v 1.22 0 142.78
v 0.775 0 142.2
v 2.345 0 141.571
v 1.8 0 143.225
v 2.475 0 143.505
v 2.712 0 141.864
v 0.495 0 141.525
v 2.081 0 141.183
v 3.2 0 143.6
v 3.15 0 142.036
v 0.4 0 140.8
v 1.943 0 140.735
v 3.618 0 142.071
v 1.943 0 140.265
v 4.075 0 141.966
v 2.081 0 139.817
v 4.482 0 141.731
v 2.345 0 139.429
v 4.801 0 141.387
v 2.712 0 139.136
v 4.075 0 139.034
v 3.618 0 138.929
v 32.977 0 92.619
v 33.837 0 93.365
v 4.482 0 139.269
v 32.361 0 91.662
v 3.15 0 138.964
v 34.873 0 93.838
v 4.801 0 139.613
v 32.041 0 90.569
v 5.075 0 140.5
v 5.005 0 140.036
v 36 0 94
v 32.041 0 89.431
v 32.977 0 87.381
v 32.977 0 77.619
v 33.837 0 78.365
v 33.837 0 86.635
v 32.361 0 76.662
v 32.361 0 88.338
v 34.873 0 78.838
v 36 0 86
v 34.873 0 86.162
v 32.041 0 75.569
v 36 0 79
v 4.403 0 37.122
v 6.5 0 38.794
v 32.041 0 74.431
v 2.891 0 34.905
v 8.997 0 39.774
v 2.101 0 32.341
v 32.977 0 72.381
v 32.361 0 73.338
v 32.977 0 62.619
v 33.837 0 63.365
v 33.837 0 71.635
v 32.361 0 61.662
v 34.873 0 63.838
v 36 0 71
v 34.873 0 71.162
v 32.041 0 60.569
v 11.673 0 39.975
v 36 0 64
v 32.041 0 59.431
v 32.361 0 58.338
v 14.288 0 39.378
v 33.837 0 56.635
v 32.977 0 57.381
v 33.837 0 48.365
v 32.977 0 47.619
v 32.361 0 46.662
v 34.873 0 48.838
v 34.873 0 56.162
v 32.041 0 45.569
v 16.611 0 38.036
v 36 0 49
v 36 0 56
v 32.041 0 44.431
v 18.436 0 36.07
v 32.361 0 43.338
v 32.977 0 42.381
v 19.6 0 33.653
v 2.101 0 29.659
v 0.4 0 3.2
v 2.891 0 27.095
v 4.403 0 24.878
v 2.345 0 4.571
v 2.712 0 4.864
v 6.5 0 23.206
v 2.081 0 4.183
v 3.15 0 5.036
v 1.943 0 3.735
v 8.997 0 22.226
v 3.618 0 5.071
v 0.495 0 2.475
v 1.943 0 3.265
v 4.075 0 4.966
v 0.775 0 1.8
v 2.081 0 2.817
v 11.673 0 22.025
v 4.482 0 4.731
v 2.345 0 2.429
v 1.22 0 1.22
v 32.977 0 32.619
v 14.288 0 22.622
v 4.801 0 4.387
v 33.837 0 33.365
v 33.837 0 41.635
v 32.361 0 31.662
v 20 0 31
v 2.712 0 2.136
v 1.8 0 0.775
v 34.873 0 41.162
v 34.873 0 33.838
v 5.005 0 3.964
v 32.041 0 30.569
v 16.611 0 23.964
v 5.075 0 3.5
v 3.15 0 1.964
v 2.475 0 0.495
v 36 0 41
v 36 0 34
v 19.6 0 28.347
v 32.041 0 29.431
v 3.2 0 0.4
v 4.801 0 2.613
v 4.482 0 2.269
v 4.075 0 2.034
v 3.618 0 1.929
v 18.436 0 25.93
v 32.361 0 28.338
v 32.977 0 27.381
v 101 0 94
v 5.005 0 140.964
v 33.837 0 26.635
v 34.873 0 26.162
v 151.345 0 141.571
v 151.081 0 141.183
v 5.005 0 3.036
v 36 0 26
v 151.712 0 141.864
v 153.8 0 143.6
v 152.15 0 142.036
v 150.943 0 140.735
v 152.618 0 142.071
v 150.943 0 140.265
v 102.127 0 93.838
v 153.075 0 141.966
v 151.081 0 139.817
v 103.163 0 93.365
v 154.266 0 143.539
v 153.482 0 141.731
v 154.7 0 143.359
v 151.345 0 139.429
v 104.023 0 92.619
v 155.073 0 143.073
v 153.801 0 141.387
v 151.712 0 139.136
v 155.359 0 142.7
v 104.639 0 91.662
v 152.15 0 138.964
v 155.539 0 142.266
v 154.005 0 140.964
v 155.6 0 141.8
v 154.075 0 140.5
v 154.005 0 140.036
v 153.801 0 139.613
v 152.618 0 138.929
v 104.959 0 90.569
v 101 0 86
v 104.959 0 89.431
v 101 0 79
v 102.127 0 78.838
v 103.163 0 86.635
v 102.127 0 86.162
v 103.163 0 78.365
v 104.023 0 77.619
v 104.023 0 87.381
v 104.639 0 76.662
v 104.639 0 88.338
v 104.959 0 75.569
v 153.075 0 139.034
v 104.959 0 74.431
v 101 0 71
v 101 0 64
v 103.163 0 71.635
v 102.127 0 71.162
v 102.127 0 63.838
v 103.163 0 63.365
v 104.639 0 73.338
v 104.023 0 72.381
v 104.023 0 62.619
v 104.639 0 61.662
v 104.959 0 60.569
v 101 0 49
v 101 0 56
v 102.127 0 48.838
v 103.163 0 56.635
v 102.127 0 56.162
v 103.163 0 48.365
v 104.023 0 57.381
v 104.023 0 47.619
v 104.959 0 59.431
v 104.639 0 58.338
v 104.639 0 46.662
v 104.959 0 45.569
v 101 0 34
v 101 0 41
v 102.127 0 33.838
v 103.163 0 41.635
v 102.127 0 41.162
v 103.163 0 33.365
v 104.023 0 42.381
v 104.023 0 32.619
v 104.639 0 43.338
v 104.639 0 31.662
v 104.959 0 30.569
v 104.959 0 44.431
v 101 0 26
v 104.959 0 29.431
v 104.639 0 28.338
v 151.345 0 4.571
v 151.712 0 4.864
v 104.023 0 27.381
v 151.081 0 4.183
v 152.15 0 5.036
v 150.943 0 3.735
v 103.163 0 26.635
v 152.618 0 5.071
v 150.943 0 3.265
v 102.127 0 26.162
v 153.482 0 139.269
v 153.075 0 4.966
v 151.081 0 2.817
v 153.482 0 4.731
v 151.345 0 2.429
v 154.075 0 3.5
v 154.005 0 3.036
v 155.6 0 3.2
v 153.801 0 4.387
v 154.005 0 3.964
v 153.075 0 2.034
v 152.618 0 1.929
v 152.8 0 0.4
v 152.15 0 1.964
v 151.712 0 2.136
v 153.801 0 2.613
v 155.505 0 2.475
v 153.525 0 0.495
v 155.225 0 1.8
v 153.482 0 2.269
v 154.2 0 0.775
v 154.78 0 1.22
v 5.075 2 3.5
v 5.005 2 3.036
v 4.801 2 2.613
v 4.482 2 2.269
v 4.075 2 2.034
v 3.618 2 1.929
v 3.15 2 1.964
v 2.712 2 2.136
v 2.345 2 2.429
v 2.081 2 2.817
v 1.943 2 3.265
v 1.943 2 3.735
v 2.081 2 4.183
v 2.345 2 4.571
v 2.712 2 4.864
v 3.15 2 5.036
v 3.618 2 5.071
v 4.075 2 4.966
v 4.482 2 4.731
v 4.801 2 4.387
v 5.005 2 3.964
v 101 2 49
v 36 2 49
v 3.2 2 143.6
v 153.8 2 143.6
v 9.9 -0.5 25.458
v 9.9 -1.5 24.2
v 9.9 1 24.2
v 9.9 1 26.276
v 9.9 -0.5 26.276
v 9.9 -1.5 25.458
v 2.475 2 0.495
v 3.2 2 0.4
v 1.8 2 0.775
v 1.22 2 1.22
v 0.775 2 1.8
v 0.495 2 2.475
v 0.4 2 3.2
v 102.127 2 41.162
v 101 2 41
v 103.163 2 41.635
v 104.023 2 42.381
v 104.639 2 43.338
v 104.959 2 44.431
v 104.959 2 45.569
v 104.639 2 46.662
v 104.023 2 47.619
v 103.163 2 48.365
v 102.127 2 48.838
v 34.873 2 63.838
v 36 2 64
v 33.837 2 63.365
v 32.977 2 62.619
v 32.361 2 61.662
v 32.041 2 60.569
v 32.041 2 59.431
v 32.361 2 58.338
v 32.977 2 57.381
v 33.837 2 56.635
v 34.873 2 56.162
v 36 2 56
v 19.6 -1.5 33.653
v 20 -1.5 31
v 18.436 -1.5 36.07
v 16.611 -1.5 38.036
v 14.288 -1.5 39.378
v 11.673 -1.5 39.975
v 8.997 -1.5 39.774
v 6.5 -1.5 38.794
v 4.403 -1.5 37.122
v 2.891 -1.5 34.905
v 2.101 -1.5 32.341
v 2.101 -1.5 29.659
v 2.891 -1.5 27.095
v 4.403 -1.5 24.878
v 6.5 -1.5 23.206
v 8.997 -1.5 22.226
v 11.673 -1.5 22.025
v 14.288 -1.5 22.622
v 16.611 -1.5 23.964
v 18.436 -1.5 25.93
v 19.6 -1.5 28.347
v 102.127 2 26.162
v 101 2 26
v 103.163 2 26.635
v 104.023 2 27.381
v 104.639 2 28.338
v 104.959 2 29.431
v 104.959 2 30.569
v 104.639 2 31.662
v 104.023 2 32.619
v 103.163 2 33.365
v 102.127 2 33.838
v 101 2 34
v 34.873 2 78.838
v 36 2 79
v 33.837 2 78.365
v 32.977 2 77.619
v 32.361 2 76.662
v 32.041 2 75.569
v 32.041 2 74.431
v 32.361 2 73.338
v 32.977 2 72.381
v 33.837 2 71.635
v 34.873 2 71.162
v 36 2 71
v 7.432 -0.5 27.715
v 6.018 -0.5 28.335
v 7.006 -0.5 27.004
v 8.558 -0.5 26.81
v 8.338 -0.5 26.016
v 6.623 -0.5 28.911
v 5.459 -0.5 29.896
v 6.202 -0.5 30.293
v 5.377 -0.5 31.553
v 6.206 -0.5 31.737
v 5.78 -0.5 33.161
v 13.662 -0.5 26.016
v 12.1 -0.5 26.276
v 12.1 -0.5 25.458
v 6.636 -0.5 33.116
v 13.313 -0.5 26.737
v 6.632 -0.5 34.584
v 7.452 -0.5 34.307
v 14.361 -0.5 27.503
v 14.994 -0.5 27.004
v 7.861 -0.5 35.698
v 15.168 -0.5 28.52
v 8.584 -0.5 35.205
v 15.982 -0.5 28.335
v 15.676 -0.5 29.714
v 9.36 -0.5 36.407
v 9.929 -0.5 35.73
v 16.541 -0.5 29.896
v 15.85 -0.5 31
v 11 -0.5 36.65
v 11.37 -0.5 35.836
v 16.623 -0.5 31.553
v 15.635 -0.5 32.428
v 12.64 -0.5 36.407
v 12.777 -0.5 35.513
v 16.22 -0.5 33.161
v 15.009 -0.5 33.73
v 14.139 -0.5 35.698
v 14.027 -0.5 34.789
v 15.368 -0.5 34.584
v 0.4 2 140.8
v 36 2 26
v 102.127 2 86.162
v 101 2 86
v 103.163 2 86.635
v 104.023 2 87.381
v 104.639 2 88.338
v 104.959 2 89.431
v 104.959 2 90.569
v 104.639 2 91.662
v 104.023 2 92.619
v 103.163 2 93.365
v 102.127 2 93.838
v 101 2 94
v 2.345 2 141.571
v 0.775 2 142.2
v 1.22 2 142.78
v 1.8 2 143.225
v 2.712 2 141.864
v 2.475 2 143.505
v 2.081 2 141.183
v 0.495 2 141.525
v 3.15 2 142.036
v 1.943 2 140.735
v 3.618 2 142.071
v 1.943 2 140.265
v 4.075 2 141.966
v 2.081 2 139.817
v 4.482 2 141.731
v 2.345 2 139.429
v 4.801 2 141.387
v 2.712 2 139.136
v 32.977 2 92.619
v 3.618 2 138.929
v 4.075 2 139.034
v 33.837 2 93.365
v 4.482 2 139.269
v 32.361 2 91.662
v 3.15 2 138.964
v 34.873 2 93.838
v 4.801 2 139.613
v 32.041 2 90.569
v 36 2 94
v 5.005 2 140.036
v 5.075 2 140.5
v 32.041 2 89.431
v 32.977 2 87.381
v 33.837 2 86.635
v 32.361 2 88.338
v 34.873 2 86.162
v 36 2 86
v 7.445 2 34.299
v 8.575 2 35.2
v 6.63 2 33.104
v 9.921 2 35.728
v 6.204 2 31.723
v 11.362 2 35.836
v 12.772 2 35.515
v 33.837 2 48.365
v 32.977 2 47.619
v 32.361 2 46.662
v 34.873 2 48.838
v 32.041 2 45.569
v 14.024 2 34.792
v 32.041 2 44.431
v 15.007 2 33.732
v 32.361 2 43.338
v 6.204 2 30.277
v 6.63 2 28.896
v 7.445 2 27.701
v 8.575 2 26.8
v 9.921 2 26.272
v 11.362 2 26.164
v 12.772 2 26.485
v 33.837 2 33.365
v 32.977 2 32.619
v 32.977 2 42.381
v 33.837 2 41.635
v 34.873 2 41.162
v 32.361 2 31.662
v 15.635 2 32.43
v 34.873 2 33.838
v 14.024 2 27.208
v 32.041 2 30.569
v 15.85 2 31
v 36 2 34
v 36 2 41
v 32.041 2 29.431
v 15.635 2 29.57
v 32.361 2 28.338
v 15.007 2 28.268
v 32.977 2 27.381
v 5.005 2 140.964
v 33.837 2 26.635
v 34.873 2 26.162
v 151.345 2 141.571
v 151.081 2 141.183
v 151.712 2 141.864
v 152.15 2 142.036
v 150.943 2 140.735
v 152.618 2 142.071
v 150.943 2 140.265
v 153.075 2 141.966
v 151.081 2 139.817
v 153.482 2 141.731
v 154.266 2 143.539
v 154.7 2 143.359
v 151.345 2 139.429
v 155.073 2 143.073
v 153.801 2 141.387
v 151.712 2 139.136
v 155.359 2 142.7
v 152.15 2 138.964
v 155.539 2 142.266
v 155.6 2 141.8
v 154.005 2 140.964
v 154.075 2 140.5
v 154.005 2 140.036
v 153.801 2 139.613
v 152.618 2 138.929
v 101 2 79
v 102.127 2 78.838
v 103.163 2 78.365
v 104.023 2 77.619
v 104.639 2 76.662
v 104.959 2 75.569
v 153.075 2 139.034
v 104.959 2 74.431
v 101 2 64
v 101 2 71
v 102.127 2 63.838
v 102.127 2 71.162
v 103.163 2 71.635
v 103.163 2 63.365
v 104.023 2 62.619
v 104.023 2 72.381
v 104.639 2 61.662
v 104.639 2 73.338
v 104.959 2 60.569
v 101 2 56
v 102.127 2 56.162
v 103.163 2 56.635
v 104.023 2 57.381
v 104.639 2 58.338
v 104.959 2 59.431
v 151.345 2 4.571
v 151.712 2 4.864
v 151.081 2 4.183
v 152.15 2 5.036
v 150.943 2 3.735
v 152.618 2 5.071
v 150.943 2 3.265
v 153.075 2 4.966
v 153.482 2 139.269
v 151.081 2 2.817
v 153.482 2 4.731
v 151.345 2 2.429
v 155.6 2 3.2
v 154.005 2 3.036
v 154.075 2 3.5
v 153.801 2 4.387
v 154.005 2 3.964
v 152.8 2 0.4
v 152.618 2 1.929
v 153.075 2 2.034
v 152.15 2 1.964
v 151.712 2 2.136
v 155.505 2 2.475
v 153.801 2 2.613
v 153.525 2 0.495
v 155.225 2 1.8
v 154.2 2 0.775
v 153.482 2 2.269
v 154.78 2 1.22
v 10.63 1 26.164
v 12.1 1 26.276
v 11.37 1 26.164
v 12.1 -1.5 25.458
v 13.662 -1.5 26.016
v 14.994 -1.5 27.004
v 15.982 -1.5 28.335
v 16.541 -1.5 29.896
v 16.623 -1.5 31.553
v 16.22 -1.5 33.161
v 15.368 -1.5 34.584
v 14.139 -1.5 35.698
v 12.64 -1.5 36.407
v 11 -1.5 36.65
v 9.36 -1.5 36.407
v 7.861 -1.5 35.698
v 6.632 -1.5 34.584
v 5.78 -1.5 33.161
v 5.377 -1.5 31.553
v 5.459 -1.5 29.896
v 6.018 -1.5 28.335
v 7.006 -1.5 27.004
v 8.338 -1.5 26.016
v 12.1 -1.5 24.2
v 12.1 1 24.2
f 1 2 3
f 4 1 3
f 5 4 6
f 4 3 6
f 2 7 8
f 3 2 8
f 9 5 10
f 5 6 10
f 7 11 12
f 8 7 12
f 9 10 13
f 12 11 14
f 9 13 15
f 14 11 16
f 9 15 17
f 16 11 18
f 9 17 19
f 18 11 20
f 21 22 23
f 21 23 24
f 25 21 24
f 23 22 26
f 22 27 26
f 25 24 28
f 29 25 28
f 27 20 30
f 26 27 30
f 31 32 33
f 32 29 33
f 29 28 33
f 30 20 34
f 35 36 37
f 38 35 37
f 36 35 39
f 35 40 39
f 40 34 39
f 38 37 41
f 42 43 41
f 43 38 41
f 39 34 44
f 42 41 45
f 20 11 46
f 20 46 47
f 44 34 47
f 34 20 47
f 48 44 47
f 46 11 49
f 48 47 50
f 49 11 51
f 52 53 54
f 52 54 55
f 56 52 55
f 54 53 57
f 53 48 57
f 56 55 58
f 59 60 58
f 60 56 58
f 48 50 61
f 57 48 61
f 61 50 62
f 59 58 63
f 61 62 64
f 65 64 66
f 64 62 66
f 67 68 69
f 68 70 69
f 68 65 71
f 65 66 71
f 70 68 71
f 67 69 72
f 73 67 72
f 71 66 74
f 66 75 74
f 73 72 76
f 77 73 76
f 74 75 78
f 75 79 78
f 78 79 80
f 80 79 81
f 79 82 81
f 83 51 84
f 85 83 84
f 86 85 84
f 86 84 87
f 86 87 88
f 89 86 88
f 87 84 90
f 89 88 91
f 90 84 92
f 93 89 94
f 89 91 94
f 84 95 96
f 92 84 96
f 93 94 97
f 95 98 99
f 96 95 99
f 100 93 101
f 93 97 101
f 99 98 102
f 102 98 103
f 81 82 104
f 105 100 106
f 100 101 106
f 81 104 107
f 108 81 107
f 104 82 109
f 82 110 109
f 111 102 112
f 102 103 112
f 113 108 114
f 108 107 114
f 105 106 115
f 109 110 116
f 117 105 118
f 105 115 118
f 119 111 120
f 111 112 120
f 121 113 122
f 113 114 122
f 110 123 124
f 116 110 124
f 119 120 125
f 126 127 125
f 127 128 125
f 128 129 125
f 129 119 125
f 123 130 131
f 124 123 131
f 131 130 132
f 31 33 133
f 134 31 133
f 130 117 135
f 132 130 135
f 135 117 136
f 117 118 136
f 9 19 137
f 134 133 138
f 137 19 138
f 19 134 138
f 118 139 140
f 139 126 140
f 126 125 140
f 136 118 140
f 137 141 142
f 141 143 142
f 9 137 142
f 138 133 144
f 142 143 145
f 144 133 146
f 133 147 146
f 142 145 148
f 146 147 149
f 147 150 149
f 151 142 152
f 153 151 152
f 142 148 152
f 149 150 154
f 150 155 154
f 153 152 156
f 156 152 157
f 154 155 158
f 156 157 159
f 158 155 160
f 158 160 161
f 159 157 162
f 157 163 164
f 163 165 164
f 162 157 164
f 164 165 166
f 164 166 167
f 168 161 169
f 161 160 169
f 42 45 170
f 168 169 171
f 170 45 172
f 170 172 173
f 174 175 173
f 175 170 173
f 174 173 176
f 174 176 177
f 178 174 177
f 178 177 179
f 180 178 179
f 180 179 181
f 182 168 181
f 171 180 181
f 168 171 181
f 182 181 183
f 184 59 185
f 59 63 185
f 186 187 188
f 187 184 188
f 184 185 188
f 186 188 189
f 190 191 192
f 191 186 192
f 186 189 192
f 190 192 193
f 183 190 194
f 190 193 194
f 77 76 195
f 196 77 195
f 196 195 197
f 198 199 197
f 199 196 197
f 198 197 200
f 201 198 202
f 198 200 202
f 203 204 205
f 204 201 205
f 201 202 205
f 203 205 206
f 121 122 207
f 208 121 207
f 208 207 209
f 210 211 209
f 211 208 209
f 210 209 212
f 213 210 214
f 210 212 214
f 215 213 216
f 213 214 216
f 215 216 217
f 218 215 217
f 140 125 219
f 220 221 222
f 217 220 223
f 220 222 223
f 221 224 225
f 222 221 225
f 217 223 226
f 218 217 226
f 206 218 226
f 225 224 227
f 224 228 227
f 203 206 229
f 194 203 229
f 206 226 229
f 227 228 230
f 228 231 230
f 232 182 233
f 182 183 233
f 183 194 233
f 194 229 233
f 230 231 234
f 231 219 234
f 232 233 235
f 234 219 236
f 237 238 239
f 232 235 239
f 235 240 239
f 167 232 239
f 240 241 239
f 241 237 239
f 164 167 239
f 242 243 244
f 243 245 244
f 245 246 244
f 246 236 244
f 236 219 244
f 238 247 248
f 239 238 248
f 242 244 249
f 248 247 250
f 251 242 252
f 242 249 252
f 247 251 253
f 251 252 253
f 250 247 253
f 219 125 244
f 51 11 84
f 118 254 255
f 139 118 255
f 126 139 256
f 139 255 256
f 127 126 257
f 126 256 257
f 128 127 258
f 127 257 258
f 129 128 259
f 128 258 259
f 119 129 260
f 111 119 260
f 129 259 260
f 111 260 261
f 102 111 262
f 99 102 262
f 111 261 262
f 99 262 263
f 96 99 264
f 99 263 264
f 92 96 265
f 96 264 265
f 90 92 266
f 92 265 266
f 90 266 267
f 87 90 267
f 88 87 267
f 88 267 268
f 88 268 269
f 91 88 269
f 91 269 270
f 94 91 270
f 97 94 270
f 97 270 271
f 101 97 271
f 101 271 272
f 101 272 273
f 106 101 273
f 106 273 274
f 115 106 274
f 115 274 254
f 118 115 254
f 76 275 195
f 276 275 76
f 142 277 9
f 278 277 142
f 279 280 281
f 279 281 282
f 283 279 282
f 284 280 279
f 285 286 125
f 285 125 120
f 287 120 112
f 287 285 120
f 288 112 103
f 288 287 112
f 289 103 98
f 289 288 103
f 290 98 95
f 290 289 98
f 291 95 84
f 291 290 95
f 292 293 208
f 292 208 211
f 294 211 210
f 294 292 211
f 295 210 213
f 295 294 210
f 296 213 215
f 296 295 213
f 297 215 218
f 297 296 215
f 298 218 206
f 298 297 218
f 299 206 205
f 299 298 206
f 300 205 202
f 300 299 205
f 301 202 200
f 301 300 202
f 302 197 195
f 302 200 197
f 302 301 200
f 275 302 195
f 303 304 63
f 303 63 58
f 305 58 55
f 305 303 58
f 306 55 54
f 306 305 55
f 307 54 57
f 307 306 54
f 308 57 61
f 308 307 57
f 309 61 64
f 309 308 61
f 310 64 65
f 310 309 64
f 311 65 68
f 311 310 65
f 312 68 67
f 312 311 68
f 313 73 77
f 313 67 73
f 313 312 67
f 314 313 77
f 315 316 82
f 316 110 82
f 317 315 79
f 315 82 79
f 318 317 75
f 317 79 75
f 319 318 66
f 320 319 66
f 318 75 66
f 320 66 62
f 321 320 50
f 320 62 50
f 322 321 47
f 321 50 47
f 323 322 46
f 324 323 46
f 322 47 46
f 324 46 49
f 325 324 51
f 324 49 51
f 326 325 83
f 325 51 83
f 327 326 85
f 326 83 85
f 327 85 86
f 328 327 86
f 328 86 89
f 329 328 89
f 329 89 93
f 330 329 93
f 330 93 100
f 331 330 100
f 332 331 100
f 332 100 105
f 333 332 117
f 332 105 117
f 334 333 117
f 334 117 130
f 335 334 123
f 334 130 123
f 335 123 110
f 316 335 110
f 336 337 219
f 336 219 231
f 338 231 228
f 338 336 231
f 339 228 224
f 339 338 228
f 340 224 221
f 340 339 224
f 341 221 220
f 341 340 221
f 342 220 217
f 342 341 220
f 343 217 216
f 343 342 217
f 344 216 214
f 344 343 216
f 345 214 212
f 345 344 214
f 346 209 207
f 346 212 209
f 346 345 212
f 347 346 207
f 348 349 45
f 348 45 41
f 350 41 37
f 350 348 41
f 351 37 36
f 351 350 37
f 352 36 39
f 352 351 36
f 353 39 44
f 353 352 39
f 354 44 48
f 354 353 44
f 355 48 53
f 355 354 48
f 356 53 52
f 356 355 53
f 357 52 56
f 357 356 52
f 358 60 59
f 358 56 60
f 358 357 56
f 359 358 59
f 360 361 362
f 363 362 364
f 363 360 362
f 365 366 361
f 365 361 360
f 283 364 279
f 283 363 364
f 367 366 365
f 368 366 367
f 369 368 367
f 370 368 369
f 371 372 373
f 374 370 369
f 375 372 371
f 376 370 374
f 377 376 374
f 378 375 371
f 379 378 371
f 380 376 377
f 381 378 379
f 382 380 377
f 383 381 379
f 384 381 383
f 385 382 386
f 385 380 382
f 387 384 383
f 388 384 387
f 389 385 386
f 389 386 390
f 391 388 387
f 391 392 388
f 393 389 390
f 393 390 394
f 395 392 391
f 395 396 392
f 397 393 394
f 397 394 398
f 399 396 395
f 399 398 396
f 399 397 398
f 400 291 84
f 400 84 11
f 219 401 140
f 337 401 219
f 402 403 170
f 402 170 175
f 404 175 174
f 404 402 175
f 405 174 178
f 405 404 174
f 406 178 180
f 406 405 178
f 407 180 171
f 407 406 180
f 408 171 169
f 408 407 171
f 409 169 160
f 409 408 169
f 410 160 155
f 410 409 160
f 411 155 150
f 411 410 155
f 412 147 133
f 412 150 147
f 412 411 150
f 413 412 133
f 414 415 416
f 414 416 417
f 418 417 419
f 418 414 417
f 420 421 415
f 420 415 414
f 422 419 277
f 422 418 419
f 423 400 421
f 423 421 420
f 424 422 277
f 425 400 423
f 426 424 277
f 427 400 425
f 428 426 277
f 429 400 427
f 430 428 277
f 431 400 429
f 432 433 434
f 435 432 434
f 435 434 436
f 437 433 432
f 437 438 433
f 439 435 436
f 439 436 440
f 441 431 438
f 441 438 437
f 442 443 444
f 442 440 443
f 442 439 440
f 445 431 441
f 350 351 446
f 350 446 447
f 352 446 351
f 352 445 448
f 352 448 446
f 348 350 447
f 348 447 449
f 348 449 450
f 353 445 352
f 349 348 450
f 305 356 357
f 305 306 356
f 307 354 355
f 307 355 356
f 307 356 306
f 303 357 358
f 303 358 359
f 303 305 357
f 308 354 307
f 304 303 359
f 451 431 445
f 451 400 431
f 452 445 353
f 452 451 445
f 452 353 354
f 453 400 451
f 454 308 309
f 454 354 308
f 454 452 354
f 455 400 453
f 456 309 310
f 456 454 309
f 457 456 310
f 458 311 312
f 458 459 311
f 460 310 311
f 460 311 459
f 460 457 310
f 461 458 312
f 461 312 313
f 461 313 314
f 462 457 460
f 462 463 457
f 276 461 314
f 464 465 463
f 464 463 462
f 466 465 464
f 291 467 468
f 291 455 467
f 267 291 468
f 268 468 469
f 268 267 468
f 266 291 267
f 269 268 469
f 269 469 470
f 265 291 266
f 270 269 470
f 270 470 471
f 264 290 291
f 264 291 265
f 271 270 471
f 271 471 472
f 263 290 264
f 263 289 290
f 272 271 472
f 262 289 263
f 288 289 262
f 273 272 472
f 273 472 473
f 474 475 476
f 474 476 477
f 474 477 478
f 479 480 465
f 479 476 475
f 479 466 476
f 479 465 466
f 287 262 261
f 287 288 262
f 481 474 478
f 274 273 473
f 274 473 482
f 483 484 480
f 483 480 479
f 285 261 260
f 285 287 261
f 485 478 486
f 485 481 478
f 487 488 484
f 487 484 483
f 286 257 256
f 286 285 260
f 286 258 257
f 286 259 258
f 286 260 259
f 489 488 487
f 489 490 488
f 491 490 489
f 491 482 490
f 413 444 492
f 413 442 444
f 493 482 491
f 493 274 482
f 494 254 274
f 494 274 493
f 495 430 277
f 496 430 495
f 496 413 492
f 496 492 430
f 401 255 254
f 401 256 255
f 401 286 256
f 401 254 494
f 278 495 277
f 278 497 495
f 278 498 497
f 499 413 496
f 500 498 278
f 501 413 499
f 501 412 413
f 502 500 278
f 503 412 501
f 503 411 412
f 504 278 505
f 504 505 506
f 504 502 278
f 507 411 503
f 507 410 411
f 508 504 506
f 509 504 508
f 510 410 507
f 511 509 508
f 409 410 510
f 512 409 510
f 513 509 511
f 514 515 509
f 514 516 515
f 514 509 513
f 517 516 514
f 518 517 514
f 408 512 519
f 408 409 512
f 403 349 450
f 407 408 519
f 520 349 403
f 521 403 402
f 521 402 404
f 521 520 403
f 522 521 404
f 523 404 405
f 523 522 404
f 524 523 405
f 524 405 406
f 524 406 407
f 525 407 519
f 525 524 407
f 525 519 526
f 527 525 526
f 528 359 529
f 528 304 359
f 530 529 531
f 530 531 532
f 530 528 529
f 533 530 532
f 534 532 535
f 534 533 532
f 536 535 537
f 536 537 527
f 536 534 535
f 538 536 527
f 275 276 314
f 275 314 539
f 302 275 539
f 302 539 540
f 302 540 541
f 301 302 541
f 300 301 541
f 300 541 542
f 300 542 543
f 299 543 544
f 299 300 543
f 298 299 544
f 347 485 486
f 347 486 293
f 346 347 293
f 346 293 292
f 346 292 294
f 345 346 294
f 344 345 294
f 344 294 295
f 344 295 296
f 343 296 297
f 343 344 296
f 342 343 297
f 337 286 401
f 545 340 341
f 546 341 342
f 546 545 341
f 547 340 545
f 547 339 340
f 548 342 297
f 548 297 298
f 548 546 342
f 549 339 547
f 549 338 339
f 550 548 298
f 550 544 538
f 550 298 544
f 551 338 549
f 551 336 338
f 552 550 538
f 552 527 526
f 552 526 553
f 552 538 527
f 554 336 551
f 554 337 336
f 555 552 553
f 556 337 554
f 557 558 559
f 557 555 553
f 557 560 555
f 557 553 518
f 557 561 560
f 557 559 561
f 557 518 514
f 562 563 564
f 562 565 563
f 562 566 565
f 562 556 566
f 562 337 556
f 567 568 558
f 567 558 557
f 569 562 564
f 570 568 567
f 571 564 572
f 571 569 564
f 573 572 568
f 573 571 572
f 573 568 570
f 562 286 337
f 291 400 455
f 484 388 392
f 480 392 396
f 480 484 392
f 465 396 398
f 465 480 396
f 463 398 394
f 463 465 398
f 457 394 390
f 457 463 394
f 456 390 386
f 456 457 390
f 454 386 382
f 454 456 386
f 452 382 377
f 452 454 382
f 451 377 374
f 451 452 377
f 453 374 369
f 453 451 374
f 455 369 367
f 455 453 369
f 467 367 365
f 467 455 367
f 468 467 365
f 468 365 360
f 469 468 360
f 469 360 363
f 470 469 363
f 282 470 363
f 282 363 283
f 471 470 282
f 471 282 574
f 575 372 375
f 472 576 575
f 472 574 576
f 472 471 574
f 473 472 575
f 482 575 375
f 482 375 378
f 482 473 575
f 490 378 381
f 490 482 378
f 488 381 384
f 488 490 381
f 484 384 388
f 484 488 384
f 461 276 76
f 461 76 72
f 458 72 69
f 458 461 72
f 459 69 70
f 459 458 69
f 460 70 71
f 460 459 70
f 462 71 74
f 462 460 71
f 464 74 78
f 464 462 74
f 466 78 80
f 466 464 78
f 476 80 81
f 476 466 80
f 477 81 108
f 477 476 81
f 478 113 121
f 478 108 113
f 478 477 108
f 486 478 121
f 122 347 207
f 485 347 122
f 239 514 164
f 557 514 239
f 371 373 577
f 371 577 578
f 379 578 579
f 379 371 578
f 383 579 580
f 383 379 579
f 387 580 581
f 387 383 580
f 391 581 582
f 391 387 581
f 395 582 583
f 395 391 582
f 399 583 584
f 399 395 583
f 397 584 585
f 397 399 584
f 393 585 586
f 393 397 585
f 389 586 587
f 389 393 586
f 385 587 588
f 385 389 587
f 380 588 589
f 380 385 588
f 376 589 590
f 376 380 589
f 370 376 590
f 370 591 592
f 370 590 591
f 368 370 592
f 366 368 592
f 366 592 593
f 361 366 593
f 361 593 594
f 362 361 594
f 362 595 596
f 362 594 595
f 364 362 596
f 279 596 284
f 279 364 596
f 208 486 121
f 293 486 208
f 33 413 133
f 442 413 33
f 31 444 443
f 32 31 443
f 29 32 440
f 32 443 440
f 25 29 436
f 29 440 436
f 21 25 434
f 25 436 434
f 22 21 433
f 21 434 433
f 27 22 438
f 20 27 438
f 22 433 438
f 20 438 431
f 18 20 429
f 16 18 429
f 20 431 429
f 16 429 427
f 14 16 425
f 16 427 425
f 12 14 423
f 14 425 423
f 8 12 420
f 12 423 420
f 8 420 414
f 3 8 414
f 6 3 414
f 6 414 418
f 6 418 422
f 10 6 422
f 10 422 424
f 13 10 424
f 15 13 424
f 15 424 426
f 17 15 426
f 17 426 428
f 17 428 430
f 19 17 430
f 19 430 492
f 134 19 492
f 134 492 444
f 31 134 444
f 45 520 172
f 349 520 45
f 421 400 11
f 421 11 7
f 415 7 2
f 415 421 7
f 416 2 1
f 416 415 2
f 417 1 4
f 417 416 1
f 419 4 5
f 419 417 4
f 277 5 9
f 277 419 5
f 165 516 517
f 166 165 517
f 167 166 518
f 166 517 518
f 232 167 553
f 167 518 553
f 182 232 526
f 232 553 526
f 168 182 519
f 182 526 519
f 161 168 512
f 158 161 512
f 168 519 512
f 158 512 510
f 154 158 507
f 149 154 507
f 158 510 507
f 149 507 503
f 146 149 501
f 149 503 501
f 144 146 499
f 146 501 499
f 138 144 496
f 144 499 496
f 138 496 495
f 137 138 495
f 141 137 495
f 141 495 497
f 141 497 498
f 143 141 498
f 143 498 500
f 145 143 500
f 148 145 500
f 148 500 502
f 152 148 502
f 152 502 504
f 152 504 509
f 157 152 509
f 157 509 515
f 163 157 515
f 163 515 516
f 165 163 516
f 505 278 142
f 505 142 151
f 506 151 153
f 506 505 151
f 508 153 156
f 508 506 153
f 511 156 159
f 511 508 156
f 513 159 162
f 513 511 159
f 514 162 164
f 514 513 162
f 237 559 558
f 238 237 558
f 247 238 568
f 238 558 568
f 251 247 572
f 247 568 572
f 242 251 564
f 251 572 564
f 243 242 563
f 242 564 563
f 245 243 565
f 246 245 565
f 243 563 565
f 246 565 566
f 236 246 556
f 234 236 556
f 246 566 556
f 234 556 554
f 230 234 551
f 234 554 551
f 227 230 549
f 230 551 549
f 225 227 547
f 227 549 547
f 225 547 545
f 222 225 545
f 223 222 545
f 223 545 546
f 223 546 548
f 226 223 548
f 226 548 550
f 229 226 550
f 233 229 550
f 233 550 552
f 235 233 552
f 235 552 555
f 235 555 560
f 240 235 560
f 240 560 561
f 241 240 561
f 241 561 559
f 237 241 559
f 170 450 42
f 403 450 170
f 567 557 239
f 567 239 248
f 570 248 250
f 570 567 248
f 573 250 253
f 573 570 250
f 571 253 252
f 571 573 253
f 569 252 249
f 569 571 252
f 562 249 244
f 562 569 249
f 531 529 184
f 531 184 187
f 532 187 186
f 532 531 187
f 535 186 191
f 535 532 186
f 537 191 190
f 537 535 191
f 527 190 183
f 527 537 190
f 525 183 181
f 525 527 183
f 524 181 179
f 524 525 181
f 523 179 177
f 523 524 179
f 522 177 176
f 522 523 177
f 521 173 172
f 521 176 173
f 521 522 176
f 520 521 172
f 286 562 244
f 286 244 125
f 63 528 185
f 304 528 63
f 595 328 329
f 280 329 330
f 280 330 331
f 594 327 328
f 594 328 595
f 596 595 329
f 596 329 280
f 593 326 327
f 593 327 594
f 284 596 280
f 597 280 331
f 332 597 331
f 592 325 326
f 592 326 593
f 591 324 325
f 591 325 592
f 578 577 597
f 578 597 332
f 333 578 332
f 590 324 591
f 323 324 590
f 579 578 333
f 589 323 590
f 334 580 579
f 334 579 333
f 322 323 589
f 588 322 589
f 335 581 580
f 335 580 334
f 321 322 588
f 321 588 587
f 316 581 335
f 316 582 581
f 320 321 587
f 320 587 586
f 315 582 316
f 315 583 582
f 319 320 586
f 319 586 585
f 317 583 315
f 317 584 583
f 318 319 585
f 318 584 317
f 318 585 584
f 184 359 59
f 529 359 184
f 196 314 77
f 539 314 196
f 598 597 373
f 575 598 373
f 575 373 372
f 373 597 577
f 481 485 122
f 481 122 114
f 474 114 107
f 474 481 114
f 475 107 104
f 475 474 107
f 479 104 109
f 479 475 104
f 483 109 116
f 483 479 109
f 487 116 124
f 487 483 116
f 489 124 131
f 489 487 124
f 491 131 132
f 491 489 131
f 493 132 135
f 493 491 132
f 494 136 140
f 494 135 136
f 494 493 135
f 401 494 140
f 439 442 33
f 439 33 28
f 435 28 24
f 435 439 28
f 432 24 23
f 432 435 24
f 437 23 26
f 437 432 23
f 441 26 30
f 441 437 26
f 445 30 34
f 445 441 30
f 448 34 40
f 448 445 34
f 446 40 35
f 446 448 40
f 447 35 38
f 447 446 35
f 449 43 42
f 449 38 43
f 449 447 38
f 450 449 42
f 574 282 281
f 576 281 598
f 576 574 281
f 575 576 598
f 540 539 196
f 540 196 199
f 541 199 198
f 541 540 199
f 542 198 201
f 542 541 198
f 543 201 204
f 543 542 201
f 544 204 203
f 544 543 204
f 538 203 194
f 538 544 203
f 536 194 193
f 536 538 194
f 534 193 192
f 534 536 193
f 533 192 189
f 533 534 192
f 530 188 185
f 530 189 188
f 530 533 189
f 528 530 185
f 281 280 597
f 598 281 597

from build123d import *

# Parameters (mm, degrees)
SKETCH1_W           = 156
SKETCH1_H           = 144
BOSS_EXTRUDE1_DEPTH = 2
SKETCH2_R           = 1.575
CUT_EXTRUDE1_DEPTH  = 5
SKETCH3_R           = 4.85
CUT_EXTRUDE2_DEPTH  = 50
SKETCH4_W           = 156
SKETCH4_H           = 144
SKETCH4_W_2         = 155.6
SKETCH4_H_2         = 143.6
CUT_EXTRUDE3_DEPTH  = 50
FILLET1_R           = 3
FILLET2_R           = 2
SKETCH5_R           = 9
SKETCH5_R_2         = 4.85
BOSS_EXTRUDE2_DEPTH = 0.5
SKETCH6_R           = 9
SKETCH6_R_2         = 5.65
BOSS_EXTRUDE3_DEPTH = 1
SKETCH7_W           = 2.2
SKETCH7_H           = 2.3
CUT_EXTRUDE4_DEPTH  = 2.5
CUT_EXTRUDE5_DEPTH  = 10


with BuildPart() as part:
    # Sketch1 → Boss-Extrude1 (new body)
    with BuildSketch(Plane(origin=(0, 0, 0), x_dir=(1, 0, 0), z_dir=(0, 1, 0))):
        with Locations((78, -72)):
            Rectangle(SKETCH1_W, SKETCH1_H)
    extrude(amount=BOSS_EXTRUDE1_DEPTH)

    # Sketch2 → Cut-Extrude1 (cut)
    with BuildSketch(Plane(origin=(0, 2, 0), x_dir=(1, 0, 0), z_dir=(0, 1, 0))):
        with Locations((3.5, -3.5)):
            Circle(SKETCH2_R)
        with Locations((152.5, -3.5)):
            Circle(SKETCH2_R)
        with Locations((152.5, -140.5)):
            Circle(SKETCH2_R)
        with Locations((3.5, -140.5)):
            Circle(SKETCH2_R)
    extrude(amount=-CUT_EXTRUDE1_DEPTH, mode=Mode.SUBTRACT)

    # Sketch3 → Cut-Extrude2 (cut)
    with BuildSketch(Plane(origin=(0, 2, 0), x_dir=(1, 0, 0), z_dir=(0, 1, 0))):
        with Locations((11, -31)):
            Circle(SKETCH3_R)
        with BuildLine():
            Line((36, -26), (101, -26))
            ThreePointArc((101, -26), (105, -30), (101, -34))
            Line((101, -34), (36, -34))
            ThreePointArc((36, -34), (32, -30), (36, -26))
        make_face()
        with BuildLine():
            Line((36, -41), (101, -41))
            ThreePointArc((101, -41), (105, -45), (101, -49))
            Line((101, -49), (36, -49))
            ThreePointArc((36, -49), (32, -45), (36, -41))
        make_face()
        with BuildLine():
            Line((36, -56), (101, -56))
            ThreePointArc((101, -56), (105, -60), (101, -64))
            Line((101, -64), (36, -64))
            ThreePointArc((36, -64), (32, -60), (36, -56))
        make_face()
        with BuildLine():
            Line((36, -71), (101, -71))
            ThreePointArc((101, -71), (105, -75), (101, -79))
            Line((101, -79), (36, -79))
            ThreePointArc((36, -79), (32, -75), (36, -71))
        make_face()
        with BuildLine():
            Line((36, -86), (101, -86))
            ThreePointArc((101, -86), (105, -90), (101, -94))
            Line((101, -94), (36, -94))
            ThreePointArc((36, -94), (32, -90), (36, -86))
        make_face()
    extrude(amount=-CUT_EXTRUDE2_DEPTH, mode=Mode.SUBTRACT)

    # Sketch4 → Cut-Extrude3 (cut)
    with BuildSketch(Plane(origin=(0, 2, 0), x_dir=(1, 0, 0), z_dir=(0, 1, 0))):
        with Locations((78, -72)):
            Rectangle(SKETCH4_W, SKETCH4_H)
        with Locations((78, -72)):
            Rectangle(SKETCH4_W_2, SKETCH4_H_2, mode=Mode.SUBTRACT)
    extrude(amount=-CUT_EXTRUDE3_DEPTH, mode=Mode.SUBTRACT)

    # Fillet1
    fillet1_edges = [part.edges().sort_by_distance(p)[0] for p in [
        (0.2, 1, 0.2),
        (155.8, 1, 0.2),
        (0.2, 1, 143.8),
    ]]
    fillet(fillet1_edges, radius=FILLET1_R)

    # Fillet2
    fillet2_edges = [part.edges().sort_by_distance(p)[0] for p in [
        (155.8, 1, 143.8),
    ]]
    fillet(fillet2_edges, radius=FILLET2_R)

    # Sketch5 → Boss-Extrude2 (add)
    with BuildSketch(Plane.XZ):
        with Locations((11, 31)):
            Circle(SKETCH5_R)
        with Locations((11, 31)):
            Circle(SKETCH5_R_2, mode=Mode.SUBTRACT)
    extrude(amount=BOSS_EXTRUDE2_DEPTH)

    # Sketch6 → Boss-Extrude3 (add)
    with BuildSketch(Plane.XZ.offset(0.5)):
        with Locations((11, 31)):
            Circle(SKETCH6_R)
        with Locations((11, 31)):
            Circle(SKETCH6_R_2, mode=Mode.SUBTRACT)
    extrude(amount=BOSS_EXTRUDE3_DEPTH)

    # Sketch7 → Cut-Extrude4 (cut)
    with BuildSketch(Plane.XZ.offset(1.5)):
        with Locations((11, 25.35)):
            Rectangle(SKETCH7_W, SKETCH7_H)
    extrude(amount=-CUT_EXTRUDE4_DEPTH, mode=Mode.SUBTRACT)

    # Sketch8 → Cut-Extrude5 (cut)
    with BuildSketch(Plane(origin=(0, 2, 0), x_dir=(1, 0, 0), z_dir=(0, 1, 0))):
        with BuildLine():
            Line((3.2, -143.8), (153.8, -143.8))
            ThreePointArc((153.8, -143.8), (155.214213562, -143.214213562), (155.8, -141.8))
            Line((155.8, -141.8), (155.8, -3.2))
            ThreePointArc((155.8, -3.2), (154.921320344, -1.078679656), (152.8, -0.2))
            Line((152.8, -0.2), (3.2, -0.2))
            ThreePointArc((3.2, -0.2), (1.078679656, -1.078679656), (0.2, -3.2))
            Line((0.2, -3.2), (0.2, -140.8))
            ThreePointArc((0.2, -140.8), (1.078679656, -142.921320344), (3.2, -143.8))
        make_face()
        with BuildLine():
            Line((3.2, -143.6), (153.8, -143.6))
            ThreePointArc((153.8, -143.6), (155.072792206, -143.072792206), (155.6, -141.8))
            Line((155.6, -141.8), (155.6, -3.2))
            ThreePointArc((155.6, -3.2), (154.779898987, -1.220101013), (152.8, -0.4))
            Line((152.8, -0.4), (3.2, -0.4))
            ThreePointArc((3.2, -0.4), (1.220101013, -1.220101013), (0.4, -3.2))
            Line((0.4, -3.2), (0.4, -140.8))
            ThreePointArc((0.4, -140.8), (1.220101013, -142.779898987), (3.2, -143.6))
        make_face(mode=Mode.SUBTRACT)
    extrude(amount=-CUT_EXTRUDE5_DEPTH, mode=Mode.SUBTRACT)


solid = part.part
